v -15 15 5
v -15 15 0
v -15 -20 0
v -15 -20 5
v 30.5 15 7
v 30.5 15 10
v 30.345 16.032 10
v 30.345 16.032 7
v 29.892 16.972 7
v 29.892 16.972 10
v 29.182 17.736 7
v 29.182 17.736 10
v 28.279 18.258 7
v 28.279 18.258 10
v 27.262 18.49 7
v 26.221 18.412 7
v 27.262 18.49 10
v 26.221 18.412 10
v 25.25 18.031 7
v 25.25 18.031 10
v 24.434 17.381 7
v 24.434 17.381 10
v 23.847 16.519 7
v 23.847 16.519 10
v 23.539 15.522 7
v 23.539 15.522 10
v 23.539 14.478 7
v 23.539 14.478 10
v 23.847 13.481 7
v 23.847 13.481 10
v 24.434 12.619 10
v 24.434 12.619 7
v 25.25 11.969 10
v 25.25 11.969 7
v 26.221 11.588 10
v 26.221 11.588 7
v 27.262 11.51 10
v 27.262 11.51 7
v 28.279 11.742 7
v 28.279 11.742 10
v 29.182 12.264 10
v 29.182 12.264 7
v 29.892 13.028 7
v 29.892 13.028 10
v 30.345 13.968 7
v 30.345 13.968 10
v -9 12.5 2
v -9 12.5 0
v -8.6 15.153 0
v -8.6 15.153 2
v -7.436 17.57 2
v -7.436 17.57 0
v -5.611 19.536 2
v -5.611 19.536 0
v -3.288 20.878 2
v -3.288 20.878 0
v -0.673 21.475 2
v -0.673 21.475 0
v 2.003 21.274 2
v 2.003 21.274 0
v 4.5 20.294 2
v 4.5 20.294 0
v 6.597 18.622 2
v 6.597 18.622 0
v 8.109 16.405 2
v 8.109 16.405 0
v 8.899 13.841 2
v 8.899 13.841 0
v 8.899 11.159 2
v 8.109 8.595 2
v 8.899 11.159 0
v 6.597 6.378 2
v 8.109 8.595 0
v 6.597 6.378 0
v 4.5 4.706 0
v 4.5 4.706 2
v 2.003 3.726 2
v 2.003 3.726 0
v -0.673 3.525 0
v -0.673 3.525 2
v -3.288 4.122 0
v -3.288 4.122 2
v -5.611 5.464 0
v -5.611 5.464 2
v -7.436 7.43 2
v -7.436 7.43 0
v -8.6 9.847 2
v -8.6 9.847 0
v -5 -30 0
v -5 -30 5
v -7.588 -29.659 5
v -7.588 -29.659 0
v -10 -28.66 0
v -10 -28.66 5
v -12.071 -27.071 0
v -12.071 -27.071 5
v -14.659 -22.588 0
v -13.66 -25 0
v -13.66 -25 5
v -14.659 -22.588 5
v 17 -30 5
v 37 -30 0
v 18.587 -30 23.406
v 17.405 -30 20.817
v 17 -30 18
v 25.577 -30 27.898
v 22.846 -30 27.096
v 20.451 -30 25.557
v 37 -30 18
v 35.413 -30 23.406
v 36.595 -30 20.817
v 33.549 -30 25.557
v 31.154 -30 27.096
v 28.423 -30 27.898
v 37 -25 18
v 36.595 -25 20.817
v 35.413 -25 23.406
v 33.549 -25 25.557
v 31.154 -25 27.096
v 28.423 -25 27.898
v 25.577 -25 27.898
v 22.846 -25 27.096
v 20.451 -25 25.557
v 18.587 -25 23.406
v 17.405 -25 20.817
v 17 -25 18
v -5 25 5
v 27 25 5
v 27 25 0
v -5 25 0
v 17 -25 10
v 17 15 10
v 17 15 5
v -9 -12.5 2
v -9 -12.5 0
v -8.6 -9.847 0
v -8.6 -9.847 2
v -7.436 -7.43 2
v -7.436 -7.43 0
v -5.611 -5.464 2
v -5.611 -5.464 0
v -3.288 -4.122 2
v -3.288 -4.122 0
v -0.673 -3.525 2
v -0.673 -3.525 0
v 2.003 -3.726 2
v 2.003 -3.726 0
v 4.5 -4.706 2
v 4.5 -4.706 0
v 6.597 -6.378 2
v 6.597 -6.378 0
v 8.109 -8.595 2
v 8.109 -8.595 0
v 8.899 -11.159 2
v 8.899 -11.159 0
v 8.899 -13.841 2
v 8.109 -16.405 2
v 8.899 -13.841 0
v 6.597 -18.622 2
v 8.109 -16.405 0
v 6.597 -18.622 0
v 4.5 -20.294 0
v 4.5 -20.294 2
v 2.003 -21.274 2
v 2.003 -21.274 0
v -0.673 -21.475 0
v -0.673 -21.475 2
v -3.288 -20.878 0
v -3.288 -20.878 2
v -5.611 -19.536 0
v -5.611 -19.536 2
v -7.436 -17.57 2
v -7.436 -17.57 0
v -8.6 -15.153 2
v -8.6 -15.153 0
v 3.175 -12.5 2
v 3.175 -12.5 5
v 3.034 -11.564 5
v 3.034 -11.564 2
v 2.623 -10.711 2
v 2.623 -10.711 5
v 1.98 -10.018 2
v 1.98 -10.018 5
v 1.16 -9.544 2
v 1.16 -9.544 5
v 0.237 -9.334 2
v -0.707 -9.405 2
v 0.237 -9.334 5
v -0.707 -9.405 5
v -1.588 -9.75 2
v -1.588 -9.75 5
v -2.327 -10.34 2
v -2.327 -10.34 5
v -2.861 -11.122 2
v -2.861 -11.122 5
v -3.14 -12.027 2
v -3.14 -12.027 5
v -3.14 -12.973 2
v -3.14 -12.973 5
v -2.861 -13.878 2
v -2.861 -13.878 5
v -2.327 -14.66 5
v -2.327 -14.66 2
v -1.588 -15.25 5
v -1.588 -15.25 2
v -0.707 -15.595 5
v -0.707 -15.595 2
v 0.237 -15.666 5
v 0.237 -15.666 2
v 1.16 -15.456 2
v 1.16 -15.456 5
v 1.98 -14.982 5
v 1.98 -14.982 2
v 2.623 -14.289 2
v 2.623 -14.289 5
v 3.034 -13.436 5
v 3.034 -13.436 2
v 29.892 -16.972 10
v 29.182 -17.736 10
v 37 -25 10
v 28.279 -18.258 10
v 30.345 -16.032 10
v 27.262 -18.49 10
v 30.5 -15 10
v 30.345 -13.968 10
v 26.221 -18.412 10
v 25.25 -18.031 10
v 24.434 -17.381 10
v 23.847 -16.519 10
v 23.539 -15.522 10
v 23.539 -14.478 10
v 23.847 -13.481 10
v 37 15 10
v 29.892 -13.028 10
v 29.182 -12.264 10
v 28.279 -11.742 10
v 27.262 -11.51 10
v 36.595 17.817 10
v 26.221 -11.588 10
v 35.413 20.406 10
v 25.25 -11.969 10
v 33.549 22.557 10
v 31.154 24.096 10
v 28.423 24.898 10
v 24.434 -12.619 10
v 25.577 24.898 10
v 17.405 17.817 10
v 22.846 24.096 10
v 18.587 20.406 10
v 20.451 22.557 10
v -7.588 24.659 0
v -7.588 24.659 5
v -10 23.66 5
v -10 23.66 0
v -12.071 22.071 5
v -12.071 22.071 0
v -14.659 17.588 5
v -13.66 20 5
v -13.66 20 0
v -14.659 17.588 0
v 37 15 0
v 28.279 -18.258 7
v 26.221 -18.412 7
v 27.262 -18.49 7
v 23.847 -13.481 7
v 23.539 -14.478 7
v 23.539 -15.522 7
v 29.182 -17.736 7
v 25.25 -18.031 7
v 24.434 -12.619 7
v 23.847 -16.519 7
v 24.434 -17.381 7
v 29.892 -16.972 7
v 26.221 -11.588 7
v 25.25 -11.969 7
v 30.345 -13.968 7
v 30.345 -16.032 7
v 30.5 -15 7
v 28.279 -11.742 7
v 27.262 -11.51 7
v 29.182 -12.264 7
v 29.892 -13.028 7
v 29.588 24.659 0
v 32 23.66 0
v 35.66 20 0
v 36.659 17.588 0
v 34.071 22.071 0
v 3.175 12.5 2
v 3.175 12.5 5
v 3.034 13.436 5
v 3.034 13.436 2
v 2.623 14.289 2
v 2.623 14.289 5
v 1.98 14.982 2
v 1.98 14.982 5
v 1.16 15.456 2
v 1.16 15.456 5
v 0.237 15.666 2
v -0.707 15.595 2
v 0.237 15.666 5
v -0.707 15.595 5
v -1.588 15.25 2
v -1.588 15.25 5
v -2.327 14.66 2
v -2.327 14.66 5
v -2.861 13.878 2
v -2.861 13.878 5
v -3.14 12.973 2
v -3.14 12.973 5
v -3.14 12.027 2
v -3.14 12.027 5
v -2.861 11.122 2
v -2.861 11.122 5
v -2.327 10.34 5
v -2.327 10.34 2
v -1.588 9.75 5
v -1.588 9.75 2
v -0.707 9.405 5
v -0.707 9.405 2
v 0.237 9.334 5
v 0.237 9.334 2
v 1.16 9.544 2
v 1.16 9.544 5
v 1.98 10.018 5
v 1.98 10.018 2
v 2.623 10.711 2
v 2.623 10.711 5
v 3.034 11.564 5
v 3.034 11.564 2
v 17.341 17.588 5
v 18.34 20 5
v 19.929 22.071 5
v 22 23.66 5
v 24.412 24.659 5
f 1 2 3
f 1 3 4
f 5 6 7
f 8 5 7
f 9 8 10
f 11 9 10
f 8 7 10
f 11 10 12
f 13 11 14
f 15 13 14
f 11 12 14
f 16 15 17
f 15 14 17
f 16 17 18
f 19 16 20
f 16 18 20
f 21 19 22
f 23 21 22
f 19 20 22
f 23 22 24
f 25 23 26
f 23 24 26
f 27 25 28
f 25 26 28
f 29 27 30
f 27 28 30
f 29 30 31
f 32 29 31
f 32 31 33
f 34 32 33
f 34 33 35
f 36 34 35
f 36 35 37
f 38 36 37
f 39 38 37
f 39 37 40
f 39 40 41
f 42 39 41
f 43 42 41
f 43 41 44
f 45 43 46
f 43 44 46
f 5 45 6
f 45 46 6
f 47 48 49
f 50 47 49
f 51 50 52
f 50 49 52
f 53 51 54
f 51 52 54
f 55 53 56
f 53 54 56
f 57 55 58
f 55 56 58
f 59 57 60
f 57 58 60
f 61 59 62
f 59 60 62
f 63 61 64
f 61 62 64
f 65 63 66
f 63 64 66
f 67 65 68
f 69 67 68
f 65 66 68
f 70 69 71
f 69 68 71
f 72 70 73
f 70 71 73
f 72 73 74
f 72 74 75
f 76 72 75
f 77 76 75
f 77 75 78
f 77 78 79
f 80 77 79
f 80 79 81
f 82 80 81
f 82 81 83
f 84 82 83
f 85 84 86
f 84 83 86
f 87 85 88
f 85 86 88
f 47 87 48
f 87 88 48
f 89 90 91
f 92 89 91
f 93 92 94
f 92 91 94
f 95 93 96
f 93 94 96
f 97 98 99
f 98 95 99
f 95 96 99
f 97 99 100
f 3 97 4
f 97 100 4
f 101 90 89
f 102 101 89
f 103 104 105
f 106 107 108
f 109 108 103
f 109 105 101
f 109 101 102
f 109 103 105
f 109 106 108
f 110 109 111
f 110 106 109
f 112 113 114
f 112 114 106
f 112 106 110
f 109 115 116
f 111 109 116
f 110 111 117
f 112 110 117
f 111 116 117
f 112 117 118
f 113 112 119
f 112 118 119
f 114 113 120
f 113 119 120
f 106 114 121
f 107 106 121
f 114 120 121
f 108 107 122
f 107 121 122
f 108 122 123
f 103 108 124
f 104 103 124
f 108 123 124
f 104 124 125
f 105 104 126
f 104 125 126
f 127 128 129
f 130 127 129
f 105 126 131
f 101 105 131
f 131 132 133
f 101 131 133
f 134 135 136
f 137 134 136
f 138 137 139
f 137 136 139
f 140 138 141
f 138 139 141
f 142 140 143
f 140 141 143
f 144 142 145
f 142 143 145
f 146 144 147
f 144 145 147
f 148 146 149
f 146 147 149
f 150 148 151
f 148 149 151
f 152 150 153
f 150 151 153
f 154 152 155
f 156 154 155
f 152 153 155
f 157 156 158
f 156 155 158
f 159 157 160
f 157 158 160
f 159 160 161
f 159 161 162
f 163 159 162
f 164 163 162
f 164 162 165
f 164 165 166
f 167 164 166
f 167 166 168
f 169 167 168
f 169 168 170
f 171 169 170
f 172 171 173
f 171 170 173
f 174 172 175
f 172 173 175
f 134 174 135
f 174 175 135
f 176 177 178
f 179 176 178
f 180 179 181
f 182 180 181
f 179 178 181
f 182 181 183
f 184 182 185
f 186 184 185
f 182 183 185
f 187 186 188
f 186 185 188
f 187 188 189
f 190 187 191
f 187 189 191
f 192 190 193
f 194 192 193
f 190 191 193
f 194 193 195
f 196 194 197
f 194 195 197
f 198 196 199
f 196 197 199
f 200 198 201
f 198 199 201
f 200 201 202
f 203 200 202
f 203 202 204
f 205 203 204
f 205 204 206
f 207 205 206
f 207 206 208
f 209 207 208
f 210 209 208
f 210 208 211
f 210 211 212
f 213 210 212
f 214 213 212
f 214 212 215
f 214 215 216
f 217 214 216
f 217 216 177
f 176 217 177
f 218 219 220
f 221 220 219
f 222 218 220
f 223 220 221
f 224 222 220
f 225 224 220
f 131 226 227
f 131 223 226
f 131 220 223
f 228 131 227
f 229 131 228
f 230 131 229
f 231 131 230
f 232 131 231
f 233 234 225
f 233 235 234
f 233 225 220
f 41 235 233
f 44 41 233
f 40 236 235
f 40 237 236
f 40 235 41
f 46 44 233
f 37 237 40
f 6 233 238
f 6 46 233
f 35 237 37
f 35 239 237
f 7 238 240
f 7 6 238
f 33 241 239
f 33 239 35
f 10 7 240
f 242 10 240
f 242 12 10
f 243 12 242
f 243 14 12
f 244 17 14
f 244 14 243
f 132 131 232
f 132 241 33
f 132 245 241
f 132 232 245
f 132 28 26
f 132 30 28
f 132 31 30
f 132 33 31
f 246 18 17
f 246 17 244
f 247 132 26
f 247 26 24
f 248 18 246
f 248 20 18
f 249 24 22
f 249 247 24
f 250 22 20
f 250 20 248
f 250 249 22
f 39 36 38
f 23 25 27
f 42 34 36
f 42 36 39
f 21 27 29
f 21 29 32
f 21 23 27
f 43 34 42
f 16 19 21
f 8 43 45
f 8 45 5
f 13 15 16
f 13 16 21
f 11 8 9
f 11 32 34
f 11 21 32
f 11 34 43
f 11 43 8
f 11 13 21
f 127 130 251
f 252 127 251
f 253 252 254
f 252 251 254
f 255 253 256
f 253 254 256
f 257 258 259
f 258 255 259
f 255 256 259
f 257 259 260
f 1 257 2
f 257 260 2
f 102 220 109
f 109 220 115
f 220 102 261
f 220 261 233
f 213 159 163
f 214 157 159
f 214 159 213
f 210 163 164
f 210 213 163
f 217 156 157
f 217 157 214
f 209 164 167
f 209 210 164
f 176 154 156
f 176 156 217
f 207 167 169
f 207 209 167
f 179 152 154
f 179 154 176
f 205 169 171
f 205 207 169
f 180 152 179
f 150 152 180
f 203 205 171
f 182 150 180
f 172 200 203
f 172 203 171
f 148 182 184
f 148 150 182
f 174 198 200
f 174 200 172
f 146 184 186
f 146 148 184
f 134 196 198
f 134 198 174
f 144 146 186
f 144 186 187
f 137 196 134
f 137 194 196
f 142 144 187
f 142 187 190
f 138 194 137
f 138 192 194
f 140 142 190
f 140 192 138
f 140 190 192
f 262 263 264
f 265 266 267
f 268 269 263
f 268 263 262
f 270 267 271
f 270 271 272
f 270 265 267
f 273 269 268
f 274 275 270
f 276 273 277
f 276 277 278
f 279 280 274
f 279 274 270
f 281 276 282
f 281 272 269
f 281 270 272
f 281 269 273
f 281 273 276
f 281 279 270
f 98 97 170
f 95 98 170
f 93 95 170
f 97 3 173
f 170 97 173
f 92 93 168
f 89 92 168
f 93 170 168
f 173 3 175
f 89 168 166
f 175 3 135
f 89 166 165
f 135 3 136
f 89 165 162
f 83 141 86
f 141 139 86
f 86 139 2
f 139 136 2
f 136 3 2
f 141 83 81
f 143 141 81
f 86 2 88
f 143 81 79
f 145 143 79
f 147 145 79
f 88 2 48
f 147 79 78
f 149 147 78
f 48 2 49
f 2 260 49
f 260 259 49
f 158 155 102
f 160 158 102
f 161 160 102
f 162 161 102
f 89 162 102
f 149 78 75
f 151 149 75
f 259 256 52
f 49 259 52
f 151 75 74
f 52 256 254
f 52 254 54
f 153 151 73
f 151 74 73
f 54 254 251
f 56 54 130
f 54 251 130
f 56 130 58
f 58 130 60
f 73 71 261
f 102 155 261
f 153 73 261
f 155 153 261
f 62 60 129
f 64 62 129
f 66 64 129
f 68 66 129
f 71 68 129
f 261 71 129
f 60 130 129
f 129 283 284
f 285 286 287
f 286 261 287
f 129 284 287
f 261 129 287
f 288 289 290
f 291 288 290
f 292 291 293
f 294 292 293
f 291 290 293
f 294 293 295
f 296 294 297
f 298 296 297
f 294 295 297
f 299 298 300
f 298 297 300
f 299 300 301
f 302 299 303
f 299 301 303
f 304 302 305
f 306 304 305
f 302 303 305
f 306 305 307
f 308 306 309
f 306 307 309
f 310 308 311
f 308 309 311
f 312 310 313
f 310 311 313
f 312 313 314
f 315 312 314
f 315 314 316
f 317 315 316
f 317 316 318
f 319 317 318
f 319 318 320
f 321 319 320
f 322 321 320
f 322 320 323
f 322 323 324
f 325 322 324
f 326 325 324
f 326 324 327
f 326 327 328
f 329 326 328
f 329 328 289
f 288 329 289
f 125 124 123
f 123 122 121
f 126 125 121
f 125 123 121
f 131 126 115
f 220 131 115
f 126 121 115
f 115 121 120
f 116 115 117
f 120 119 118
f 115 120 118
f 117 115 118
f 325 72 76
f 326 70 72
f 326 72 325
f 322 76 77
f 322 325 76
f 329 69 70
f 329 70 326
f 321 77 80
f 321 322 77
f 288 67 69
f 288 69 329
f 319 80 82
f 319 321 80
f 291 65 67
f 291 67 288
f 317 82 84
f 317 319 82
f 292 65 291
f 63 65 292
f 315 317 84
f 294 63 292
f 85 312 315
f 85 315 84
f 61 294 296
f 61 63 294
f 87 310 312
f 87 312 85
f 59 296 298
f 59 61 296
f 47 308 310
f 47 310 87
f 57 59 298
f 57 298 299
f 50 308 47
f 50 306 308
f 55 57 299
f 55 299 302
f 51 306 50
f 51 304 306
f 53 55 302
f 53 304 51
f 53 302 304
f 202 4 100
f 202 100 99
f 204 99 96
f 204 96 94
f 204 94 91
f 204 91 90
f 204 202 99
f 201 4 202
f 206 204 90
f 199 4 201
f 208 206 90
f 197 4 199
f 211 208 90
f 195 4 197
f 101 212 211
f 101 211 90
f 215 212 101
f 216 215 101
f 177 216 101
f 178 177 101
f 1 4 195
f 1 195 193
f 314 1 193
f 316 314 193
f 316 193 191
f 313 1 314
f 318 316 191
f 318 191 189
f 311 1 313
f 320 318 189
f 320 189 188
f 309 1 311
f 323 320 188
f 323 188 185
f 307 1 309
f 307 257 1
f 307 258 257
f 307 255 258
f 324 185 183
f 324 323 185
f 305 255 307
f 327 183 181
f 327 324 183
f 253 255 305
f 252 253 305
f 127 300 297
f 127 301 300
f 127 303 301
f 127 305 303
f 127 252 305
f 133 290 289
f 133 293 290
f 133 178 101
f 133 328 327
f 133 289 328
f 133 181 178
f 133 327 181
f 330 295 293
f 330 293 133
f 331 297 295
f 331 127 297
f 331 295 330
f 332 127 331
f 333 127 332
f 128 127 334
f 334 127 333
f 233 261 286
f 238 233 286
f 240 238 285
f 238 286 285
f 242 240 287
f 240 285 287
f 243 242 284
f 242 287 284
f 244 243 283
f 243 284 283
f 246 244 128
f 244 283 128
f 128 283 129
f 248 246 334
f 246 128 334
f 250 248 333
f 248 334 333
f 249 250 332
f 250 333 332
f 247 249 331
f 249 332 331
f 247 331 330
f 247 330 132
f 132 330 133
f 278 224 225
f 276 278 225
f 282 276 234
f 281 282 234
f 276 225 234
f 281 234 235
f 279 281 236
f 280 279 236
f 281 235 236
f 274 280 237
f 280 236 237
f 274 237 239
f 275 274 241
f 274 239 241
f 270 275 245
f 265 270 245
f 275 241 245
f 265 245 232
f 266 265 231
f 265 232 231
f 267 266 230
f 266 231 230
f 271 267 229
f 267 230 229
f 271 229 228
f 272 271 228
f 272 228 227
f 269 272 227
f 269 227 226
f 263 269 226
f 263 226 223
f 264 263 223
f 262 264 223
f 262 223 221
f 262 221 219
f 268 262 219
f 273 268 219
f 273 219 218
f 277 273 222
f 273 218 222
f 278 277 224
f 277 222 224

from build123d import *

# Parameters (mm, degrees)
SKETCH1_W           = 30
SKETCH1_H           = 50
BOSS_EXTRUDE1_DEPTH = 5
SKETCH5_R           = 3.175
CUT_EXTRUDE2_DEPTH  = 30.580398915
SKETCH2_W           = 5
SKETCH2_H           = 50
BOSS_EXTRUDE2_DEPTH = 2
SKETCH3_W           = 10
SKETCH3_H           = 50
BOSS_EXTRUDE3_DEPTH = 20
SKETCH4_R           = 3.5
CUT_EXTRUDE1_DEPTH  = 3
SKETCH6_R           = 9
CUT_EXTRUDE3_DEPTH  = 2
SKETCH7_W           = 32
SKETCH7_H           = 5
SKETCH7_W_2         = 20
SKETCH7_H_2         = 18
BOSS_EXTRUDE4_DEPTH = 5
FILLET1_R           = 10


with BuildPart() as part:
    # Sketch1 → Boss-Extrude1 (new body)
    with BuildSketch(Plane.XY):
        Rectangle(SKETCH1_W, SKETCH1_H)
    extrude(amount=BOSS_EXTRUDE1_DEPTH)

    # Sketch5 → Cut-Extrude2 (cut, through all)
    with BuildSketch(Plane.XY.offset(5)):
        with Locations((0, 12.5)):
            Circle(SKETCH5_R)
        with Locations((0, -12.5)):
            Circle(SKETCH5_R)
    extrude(amount=-CUT_EXTRUDE2_DEPTH, mode=Mode.SUBTRACT)

    # Sketch2 → Boss-Extrude2 (add)
    with BuildSketch(Plane(origin=(15, 0, 0), x_dir=(0, 0, -1), z_dir=(1, 0, 0))):
        with Locations((-2.5, 0)):
            Rectangle(SKETCH2_W, SKETCH2_H)
    extrude(amount=BOSS_EXTRUDE2_DEPTH)

    # Sketch3 → Boss-Extrude3 (add)
    with BuildSketch(Plane(origin=(17, 0, 0), x_dir=(0, 0, -1), z_dir=(1, 0, 0))):
        with Locations((-5, 0)):
            Rectangle(SKETCH3_W, SKETCH3_H)
    extrude(amount=BOSS_EXTRUDE3_DEPTH)

    # Sketch4 → Cut-Extrude1 (cut)
    with BuildSketch(Plane.XY.offset(10)):
        with Locations((27, 15)):
            Circle(SKETCH4_R)
        with Locations((27, -15)):
            Circle(SKETCH4_R)
    extrude(amount=-CUT_EXTRUDE1_DEPTH, mode=Mode.SUBTRACT)

    # Sketch6 → Cut-Extrude3 (cut)
    with BuildSketch(Plane(origin=(0, 0, 0), x_dir=(-1, 0, 0), z_dir=(0, 0, -1))):
        with Locations((0, 12.5)):
            Circle(SKETCH6_R)
        with Locations((0, -12.5)):
            Circle(SKETCH6_R)
    extrude(amount=-CUT_EXTRUDE3_DEPTH, mode=Mode.SUBTRACT)

    # Sketch7 → Boss-Extrude4 (add)
    with BuildSketch(Plane.XZ.offset(25)):
        with Locations((1, 2.5)):
            Rectangle(SKETCH7_W, SKETCH7_H)
        Polygon((17, 0), (37, 0), (37, 10), (17, 10), (17, 5), align=None)
        with Locations((27, 19)):
            Rectangle(SKETCH7_W_2, SKETCH7_H_2)
    extrude(amount=BOSS_EXTRUDE4_DEPTH)

    # Fillet1
    # the kernel refuses this fillet: 10 mm, written as the material it takes off along each edge
    with BuildSketch(Plane(origin=(17, 25, 5), x_dir=(0, -1, 0), z_dir=(0, 0, 1))) as fillet1_piece_1:
        with BuildLine():
            CenterArc((FILLET1_R, FILLET1_R), FILLET1_R, 180, 90)
            Line((0, FILLET1_R), (0, 0))
            Line((0, 0), (FILLET1_R, 0))
        make_face()
    extrude(amount=30, mode=Mode.SUBTRACT)
    with BuildSketch(Plane(origin=(37, 25, -25), x_dir=(0, -1, 0), z_dir=(0, 0, 1))) as fillet1_piece_2:
        with BuildLine():
            CenterArc((FILLET1_R, -FILLET1_R), FILLET1_R, 90, 90)
            Line((0, -FILLET1_R), (0, 0))
            Line((0, 0), (FILLET1_R, 0))
        make_face()
    extrude(amount=60, mode=Mode.SUBTRACT)
    with BuildSketch(Plane(origin=(37, 0, 28), x_dir=(0, 0, -1), z_dir=(0, -1, 0)), Plane(origin=(17, 0, 28), x_dir=(1, 0, 0), z_dir=(0, -1, 0))) as fillet1_piece_3:
        with BuildLine():
            CenterArc((FILLET1_R, -FILLET1_R), FILLET1_R, 90, 90)
            Line((0, -FILLET1_R), (0, 0))
            Line((0, 0), (FILLET1_R, 0))
        make_face()
    extrude(amount=55, mode=Mode.SUBTRACT)
    with BuildSketch(Plane(origin=(-15, -30, 30), x_dir=(0, 1, 0), z_dir=(0, 0, -1)), Plane(origin=(-15, 25, -25), x_dir=(0, -1, 0), z_dir=(0, 0, 1))) as fillet1_piece_4:
        with BuildLine():
            CenterArc((FILLET1_R, FILLET1_R), FILLET1_R, 180, 90)
            Line((0, FILLET1_R), (0, 0))
            Line((0, 0), (FILLET1_R, 0))
        make_face()
    extrude(amount=55, mode=Mode.SUBTRACT)


solid = part.part
